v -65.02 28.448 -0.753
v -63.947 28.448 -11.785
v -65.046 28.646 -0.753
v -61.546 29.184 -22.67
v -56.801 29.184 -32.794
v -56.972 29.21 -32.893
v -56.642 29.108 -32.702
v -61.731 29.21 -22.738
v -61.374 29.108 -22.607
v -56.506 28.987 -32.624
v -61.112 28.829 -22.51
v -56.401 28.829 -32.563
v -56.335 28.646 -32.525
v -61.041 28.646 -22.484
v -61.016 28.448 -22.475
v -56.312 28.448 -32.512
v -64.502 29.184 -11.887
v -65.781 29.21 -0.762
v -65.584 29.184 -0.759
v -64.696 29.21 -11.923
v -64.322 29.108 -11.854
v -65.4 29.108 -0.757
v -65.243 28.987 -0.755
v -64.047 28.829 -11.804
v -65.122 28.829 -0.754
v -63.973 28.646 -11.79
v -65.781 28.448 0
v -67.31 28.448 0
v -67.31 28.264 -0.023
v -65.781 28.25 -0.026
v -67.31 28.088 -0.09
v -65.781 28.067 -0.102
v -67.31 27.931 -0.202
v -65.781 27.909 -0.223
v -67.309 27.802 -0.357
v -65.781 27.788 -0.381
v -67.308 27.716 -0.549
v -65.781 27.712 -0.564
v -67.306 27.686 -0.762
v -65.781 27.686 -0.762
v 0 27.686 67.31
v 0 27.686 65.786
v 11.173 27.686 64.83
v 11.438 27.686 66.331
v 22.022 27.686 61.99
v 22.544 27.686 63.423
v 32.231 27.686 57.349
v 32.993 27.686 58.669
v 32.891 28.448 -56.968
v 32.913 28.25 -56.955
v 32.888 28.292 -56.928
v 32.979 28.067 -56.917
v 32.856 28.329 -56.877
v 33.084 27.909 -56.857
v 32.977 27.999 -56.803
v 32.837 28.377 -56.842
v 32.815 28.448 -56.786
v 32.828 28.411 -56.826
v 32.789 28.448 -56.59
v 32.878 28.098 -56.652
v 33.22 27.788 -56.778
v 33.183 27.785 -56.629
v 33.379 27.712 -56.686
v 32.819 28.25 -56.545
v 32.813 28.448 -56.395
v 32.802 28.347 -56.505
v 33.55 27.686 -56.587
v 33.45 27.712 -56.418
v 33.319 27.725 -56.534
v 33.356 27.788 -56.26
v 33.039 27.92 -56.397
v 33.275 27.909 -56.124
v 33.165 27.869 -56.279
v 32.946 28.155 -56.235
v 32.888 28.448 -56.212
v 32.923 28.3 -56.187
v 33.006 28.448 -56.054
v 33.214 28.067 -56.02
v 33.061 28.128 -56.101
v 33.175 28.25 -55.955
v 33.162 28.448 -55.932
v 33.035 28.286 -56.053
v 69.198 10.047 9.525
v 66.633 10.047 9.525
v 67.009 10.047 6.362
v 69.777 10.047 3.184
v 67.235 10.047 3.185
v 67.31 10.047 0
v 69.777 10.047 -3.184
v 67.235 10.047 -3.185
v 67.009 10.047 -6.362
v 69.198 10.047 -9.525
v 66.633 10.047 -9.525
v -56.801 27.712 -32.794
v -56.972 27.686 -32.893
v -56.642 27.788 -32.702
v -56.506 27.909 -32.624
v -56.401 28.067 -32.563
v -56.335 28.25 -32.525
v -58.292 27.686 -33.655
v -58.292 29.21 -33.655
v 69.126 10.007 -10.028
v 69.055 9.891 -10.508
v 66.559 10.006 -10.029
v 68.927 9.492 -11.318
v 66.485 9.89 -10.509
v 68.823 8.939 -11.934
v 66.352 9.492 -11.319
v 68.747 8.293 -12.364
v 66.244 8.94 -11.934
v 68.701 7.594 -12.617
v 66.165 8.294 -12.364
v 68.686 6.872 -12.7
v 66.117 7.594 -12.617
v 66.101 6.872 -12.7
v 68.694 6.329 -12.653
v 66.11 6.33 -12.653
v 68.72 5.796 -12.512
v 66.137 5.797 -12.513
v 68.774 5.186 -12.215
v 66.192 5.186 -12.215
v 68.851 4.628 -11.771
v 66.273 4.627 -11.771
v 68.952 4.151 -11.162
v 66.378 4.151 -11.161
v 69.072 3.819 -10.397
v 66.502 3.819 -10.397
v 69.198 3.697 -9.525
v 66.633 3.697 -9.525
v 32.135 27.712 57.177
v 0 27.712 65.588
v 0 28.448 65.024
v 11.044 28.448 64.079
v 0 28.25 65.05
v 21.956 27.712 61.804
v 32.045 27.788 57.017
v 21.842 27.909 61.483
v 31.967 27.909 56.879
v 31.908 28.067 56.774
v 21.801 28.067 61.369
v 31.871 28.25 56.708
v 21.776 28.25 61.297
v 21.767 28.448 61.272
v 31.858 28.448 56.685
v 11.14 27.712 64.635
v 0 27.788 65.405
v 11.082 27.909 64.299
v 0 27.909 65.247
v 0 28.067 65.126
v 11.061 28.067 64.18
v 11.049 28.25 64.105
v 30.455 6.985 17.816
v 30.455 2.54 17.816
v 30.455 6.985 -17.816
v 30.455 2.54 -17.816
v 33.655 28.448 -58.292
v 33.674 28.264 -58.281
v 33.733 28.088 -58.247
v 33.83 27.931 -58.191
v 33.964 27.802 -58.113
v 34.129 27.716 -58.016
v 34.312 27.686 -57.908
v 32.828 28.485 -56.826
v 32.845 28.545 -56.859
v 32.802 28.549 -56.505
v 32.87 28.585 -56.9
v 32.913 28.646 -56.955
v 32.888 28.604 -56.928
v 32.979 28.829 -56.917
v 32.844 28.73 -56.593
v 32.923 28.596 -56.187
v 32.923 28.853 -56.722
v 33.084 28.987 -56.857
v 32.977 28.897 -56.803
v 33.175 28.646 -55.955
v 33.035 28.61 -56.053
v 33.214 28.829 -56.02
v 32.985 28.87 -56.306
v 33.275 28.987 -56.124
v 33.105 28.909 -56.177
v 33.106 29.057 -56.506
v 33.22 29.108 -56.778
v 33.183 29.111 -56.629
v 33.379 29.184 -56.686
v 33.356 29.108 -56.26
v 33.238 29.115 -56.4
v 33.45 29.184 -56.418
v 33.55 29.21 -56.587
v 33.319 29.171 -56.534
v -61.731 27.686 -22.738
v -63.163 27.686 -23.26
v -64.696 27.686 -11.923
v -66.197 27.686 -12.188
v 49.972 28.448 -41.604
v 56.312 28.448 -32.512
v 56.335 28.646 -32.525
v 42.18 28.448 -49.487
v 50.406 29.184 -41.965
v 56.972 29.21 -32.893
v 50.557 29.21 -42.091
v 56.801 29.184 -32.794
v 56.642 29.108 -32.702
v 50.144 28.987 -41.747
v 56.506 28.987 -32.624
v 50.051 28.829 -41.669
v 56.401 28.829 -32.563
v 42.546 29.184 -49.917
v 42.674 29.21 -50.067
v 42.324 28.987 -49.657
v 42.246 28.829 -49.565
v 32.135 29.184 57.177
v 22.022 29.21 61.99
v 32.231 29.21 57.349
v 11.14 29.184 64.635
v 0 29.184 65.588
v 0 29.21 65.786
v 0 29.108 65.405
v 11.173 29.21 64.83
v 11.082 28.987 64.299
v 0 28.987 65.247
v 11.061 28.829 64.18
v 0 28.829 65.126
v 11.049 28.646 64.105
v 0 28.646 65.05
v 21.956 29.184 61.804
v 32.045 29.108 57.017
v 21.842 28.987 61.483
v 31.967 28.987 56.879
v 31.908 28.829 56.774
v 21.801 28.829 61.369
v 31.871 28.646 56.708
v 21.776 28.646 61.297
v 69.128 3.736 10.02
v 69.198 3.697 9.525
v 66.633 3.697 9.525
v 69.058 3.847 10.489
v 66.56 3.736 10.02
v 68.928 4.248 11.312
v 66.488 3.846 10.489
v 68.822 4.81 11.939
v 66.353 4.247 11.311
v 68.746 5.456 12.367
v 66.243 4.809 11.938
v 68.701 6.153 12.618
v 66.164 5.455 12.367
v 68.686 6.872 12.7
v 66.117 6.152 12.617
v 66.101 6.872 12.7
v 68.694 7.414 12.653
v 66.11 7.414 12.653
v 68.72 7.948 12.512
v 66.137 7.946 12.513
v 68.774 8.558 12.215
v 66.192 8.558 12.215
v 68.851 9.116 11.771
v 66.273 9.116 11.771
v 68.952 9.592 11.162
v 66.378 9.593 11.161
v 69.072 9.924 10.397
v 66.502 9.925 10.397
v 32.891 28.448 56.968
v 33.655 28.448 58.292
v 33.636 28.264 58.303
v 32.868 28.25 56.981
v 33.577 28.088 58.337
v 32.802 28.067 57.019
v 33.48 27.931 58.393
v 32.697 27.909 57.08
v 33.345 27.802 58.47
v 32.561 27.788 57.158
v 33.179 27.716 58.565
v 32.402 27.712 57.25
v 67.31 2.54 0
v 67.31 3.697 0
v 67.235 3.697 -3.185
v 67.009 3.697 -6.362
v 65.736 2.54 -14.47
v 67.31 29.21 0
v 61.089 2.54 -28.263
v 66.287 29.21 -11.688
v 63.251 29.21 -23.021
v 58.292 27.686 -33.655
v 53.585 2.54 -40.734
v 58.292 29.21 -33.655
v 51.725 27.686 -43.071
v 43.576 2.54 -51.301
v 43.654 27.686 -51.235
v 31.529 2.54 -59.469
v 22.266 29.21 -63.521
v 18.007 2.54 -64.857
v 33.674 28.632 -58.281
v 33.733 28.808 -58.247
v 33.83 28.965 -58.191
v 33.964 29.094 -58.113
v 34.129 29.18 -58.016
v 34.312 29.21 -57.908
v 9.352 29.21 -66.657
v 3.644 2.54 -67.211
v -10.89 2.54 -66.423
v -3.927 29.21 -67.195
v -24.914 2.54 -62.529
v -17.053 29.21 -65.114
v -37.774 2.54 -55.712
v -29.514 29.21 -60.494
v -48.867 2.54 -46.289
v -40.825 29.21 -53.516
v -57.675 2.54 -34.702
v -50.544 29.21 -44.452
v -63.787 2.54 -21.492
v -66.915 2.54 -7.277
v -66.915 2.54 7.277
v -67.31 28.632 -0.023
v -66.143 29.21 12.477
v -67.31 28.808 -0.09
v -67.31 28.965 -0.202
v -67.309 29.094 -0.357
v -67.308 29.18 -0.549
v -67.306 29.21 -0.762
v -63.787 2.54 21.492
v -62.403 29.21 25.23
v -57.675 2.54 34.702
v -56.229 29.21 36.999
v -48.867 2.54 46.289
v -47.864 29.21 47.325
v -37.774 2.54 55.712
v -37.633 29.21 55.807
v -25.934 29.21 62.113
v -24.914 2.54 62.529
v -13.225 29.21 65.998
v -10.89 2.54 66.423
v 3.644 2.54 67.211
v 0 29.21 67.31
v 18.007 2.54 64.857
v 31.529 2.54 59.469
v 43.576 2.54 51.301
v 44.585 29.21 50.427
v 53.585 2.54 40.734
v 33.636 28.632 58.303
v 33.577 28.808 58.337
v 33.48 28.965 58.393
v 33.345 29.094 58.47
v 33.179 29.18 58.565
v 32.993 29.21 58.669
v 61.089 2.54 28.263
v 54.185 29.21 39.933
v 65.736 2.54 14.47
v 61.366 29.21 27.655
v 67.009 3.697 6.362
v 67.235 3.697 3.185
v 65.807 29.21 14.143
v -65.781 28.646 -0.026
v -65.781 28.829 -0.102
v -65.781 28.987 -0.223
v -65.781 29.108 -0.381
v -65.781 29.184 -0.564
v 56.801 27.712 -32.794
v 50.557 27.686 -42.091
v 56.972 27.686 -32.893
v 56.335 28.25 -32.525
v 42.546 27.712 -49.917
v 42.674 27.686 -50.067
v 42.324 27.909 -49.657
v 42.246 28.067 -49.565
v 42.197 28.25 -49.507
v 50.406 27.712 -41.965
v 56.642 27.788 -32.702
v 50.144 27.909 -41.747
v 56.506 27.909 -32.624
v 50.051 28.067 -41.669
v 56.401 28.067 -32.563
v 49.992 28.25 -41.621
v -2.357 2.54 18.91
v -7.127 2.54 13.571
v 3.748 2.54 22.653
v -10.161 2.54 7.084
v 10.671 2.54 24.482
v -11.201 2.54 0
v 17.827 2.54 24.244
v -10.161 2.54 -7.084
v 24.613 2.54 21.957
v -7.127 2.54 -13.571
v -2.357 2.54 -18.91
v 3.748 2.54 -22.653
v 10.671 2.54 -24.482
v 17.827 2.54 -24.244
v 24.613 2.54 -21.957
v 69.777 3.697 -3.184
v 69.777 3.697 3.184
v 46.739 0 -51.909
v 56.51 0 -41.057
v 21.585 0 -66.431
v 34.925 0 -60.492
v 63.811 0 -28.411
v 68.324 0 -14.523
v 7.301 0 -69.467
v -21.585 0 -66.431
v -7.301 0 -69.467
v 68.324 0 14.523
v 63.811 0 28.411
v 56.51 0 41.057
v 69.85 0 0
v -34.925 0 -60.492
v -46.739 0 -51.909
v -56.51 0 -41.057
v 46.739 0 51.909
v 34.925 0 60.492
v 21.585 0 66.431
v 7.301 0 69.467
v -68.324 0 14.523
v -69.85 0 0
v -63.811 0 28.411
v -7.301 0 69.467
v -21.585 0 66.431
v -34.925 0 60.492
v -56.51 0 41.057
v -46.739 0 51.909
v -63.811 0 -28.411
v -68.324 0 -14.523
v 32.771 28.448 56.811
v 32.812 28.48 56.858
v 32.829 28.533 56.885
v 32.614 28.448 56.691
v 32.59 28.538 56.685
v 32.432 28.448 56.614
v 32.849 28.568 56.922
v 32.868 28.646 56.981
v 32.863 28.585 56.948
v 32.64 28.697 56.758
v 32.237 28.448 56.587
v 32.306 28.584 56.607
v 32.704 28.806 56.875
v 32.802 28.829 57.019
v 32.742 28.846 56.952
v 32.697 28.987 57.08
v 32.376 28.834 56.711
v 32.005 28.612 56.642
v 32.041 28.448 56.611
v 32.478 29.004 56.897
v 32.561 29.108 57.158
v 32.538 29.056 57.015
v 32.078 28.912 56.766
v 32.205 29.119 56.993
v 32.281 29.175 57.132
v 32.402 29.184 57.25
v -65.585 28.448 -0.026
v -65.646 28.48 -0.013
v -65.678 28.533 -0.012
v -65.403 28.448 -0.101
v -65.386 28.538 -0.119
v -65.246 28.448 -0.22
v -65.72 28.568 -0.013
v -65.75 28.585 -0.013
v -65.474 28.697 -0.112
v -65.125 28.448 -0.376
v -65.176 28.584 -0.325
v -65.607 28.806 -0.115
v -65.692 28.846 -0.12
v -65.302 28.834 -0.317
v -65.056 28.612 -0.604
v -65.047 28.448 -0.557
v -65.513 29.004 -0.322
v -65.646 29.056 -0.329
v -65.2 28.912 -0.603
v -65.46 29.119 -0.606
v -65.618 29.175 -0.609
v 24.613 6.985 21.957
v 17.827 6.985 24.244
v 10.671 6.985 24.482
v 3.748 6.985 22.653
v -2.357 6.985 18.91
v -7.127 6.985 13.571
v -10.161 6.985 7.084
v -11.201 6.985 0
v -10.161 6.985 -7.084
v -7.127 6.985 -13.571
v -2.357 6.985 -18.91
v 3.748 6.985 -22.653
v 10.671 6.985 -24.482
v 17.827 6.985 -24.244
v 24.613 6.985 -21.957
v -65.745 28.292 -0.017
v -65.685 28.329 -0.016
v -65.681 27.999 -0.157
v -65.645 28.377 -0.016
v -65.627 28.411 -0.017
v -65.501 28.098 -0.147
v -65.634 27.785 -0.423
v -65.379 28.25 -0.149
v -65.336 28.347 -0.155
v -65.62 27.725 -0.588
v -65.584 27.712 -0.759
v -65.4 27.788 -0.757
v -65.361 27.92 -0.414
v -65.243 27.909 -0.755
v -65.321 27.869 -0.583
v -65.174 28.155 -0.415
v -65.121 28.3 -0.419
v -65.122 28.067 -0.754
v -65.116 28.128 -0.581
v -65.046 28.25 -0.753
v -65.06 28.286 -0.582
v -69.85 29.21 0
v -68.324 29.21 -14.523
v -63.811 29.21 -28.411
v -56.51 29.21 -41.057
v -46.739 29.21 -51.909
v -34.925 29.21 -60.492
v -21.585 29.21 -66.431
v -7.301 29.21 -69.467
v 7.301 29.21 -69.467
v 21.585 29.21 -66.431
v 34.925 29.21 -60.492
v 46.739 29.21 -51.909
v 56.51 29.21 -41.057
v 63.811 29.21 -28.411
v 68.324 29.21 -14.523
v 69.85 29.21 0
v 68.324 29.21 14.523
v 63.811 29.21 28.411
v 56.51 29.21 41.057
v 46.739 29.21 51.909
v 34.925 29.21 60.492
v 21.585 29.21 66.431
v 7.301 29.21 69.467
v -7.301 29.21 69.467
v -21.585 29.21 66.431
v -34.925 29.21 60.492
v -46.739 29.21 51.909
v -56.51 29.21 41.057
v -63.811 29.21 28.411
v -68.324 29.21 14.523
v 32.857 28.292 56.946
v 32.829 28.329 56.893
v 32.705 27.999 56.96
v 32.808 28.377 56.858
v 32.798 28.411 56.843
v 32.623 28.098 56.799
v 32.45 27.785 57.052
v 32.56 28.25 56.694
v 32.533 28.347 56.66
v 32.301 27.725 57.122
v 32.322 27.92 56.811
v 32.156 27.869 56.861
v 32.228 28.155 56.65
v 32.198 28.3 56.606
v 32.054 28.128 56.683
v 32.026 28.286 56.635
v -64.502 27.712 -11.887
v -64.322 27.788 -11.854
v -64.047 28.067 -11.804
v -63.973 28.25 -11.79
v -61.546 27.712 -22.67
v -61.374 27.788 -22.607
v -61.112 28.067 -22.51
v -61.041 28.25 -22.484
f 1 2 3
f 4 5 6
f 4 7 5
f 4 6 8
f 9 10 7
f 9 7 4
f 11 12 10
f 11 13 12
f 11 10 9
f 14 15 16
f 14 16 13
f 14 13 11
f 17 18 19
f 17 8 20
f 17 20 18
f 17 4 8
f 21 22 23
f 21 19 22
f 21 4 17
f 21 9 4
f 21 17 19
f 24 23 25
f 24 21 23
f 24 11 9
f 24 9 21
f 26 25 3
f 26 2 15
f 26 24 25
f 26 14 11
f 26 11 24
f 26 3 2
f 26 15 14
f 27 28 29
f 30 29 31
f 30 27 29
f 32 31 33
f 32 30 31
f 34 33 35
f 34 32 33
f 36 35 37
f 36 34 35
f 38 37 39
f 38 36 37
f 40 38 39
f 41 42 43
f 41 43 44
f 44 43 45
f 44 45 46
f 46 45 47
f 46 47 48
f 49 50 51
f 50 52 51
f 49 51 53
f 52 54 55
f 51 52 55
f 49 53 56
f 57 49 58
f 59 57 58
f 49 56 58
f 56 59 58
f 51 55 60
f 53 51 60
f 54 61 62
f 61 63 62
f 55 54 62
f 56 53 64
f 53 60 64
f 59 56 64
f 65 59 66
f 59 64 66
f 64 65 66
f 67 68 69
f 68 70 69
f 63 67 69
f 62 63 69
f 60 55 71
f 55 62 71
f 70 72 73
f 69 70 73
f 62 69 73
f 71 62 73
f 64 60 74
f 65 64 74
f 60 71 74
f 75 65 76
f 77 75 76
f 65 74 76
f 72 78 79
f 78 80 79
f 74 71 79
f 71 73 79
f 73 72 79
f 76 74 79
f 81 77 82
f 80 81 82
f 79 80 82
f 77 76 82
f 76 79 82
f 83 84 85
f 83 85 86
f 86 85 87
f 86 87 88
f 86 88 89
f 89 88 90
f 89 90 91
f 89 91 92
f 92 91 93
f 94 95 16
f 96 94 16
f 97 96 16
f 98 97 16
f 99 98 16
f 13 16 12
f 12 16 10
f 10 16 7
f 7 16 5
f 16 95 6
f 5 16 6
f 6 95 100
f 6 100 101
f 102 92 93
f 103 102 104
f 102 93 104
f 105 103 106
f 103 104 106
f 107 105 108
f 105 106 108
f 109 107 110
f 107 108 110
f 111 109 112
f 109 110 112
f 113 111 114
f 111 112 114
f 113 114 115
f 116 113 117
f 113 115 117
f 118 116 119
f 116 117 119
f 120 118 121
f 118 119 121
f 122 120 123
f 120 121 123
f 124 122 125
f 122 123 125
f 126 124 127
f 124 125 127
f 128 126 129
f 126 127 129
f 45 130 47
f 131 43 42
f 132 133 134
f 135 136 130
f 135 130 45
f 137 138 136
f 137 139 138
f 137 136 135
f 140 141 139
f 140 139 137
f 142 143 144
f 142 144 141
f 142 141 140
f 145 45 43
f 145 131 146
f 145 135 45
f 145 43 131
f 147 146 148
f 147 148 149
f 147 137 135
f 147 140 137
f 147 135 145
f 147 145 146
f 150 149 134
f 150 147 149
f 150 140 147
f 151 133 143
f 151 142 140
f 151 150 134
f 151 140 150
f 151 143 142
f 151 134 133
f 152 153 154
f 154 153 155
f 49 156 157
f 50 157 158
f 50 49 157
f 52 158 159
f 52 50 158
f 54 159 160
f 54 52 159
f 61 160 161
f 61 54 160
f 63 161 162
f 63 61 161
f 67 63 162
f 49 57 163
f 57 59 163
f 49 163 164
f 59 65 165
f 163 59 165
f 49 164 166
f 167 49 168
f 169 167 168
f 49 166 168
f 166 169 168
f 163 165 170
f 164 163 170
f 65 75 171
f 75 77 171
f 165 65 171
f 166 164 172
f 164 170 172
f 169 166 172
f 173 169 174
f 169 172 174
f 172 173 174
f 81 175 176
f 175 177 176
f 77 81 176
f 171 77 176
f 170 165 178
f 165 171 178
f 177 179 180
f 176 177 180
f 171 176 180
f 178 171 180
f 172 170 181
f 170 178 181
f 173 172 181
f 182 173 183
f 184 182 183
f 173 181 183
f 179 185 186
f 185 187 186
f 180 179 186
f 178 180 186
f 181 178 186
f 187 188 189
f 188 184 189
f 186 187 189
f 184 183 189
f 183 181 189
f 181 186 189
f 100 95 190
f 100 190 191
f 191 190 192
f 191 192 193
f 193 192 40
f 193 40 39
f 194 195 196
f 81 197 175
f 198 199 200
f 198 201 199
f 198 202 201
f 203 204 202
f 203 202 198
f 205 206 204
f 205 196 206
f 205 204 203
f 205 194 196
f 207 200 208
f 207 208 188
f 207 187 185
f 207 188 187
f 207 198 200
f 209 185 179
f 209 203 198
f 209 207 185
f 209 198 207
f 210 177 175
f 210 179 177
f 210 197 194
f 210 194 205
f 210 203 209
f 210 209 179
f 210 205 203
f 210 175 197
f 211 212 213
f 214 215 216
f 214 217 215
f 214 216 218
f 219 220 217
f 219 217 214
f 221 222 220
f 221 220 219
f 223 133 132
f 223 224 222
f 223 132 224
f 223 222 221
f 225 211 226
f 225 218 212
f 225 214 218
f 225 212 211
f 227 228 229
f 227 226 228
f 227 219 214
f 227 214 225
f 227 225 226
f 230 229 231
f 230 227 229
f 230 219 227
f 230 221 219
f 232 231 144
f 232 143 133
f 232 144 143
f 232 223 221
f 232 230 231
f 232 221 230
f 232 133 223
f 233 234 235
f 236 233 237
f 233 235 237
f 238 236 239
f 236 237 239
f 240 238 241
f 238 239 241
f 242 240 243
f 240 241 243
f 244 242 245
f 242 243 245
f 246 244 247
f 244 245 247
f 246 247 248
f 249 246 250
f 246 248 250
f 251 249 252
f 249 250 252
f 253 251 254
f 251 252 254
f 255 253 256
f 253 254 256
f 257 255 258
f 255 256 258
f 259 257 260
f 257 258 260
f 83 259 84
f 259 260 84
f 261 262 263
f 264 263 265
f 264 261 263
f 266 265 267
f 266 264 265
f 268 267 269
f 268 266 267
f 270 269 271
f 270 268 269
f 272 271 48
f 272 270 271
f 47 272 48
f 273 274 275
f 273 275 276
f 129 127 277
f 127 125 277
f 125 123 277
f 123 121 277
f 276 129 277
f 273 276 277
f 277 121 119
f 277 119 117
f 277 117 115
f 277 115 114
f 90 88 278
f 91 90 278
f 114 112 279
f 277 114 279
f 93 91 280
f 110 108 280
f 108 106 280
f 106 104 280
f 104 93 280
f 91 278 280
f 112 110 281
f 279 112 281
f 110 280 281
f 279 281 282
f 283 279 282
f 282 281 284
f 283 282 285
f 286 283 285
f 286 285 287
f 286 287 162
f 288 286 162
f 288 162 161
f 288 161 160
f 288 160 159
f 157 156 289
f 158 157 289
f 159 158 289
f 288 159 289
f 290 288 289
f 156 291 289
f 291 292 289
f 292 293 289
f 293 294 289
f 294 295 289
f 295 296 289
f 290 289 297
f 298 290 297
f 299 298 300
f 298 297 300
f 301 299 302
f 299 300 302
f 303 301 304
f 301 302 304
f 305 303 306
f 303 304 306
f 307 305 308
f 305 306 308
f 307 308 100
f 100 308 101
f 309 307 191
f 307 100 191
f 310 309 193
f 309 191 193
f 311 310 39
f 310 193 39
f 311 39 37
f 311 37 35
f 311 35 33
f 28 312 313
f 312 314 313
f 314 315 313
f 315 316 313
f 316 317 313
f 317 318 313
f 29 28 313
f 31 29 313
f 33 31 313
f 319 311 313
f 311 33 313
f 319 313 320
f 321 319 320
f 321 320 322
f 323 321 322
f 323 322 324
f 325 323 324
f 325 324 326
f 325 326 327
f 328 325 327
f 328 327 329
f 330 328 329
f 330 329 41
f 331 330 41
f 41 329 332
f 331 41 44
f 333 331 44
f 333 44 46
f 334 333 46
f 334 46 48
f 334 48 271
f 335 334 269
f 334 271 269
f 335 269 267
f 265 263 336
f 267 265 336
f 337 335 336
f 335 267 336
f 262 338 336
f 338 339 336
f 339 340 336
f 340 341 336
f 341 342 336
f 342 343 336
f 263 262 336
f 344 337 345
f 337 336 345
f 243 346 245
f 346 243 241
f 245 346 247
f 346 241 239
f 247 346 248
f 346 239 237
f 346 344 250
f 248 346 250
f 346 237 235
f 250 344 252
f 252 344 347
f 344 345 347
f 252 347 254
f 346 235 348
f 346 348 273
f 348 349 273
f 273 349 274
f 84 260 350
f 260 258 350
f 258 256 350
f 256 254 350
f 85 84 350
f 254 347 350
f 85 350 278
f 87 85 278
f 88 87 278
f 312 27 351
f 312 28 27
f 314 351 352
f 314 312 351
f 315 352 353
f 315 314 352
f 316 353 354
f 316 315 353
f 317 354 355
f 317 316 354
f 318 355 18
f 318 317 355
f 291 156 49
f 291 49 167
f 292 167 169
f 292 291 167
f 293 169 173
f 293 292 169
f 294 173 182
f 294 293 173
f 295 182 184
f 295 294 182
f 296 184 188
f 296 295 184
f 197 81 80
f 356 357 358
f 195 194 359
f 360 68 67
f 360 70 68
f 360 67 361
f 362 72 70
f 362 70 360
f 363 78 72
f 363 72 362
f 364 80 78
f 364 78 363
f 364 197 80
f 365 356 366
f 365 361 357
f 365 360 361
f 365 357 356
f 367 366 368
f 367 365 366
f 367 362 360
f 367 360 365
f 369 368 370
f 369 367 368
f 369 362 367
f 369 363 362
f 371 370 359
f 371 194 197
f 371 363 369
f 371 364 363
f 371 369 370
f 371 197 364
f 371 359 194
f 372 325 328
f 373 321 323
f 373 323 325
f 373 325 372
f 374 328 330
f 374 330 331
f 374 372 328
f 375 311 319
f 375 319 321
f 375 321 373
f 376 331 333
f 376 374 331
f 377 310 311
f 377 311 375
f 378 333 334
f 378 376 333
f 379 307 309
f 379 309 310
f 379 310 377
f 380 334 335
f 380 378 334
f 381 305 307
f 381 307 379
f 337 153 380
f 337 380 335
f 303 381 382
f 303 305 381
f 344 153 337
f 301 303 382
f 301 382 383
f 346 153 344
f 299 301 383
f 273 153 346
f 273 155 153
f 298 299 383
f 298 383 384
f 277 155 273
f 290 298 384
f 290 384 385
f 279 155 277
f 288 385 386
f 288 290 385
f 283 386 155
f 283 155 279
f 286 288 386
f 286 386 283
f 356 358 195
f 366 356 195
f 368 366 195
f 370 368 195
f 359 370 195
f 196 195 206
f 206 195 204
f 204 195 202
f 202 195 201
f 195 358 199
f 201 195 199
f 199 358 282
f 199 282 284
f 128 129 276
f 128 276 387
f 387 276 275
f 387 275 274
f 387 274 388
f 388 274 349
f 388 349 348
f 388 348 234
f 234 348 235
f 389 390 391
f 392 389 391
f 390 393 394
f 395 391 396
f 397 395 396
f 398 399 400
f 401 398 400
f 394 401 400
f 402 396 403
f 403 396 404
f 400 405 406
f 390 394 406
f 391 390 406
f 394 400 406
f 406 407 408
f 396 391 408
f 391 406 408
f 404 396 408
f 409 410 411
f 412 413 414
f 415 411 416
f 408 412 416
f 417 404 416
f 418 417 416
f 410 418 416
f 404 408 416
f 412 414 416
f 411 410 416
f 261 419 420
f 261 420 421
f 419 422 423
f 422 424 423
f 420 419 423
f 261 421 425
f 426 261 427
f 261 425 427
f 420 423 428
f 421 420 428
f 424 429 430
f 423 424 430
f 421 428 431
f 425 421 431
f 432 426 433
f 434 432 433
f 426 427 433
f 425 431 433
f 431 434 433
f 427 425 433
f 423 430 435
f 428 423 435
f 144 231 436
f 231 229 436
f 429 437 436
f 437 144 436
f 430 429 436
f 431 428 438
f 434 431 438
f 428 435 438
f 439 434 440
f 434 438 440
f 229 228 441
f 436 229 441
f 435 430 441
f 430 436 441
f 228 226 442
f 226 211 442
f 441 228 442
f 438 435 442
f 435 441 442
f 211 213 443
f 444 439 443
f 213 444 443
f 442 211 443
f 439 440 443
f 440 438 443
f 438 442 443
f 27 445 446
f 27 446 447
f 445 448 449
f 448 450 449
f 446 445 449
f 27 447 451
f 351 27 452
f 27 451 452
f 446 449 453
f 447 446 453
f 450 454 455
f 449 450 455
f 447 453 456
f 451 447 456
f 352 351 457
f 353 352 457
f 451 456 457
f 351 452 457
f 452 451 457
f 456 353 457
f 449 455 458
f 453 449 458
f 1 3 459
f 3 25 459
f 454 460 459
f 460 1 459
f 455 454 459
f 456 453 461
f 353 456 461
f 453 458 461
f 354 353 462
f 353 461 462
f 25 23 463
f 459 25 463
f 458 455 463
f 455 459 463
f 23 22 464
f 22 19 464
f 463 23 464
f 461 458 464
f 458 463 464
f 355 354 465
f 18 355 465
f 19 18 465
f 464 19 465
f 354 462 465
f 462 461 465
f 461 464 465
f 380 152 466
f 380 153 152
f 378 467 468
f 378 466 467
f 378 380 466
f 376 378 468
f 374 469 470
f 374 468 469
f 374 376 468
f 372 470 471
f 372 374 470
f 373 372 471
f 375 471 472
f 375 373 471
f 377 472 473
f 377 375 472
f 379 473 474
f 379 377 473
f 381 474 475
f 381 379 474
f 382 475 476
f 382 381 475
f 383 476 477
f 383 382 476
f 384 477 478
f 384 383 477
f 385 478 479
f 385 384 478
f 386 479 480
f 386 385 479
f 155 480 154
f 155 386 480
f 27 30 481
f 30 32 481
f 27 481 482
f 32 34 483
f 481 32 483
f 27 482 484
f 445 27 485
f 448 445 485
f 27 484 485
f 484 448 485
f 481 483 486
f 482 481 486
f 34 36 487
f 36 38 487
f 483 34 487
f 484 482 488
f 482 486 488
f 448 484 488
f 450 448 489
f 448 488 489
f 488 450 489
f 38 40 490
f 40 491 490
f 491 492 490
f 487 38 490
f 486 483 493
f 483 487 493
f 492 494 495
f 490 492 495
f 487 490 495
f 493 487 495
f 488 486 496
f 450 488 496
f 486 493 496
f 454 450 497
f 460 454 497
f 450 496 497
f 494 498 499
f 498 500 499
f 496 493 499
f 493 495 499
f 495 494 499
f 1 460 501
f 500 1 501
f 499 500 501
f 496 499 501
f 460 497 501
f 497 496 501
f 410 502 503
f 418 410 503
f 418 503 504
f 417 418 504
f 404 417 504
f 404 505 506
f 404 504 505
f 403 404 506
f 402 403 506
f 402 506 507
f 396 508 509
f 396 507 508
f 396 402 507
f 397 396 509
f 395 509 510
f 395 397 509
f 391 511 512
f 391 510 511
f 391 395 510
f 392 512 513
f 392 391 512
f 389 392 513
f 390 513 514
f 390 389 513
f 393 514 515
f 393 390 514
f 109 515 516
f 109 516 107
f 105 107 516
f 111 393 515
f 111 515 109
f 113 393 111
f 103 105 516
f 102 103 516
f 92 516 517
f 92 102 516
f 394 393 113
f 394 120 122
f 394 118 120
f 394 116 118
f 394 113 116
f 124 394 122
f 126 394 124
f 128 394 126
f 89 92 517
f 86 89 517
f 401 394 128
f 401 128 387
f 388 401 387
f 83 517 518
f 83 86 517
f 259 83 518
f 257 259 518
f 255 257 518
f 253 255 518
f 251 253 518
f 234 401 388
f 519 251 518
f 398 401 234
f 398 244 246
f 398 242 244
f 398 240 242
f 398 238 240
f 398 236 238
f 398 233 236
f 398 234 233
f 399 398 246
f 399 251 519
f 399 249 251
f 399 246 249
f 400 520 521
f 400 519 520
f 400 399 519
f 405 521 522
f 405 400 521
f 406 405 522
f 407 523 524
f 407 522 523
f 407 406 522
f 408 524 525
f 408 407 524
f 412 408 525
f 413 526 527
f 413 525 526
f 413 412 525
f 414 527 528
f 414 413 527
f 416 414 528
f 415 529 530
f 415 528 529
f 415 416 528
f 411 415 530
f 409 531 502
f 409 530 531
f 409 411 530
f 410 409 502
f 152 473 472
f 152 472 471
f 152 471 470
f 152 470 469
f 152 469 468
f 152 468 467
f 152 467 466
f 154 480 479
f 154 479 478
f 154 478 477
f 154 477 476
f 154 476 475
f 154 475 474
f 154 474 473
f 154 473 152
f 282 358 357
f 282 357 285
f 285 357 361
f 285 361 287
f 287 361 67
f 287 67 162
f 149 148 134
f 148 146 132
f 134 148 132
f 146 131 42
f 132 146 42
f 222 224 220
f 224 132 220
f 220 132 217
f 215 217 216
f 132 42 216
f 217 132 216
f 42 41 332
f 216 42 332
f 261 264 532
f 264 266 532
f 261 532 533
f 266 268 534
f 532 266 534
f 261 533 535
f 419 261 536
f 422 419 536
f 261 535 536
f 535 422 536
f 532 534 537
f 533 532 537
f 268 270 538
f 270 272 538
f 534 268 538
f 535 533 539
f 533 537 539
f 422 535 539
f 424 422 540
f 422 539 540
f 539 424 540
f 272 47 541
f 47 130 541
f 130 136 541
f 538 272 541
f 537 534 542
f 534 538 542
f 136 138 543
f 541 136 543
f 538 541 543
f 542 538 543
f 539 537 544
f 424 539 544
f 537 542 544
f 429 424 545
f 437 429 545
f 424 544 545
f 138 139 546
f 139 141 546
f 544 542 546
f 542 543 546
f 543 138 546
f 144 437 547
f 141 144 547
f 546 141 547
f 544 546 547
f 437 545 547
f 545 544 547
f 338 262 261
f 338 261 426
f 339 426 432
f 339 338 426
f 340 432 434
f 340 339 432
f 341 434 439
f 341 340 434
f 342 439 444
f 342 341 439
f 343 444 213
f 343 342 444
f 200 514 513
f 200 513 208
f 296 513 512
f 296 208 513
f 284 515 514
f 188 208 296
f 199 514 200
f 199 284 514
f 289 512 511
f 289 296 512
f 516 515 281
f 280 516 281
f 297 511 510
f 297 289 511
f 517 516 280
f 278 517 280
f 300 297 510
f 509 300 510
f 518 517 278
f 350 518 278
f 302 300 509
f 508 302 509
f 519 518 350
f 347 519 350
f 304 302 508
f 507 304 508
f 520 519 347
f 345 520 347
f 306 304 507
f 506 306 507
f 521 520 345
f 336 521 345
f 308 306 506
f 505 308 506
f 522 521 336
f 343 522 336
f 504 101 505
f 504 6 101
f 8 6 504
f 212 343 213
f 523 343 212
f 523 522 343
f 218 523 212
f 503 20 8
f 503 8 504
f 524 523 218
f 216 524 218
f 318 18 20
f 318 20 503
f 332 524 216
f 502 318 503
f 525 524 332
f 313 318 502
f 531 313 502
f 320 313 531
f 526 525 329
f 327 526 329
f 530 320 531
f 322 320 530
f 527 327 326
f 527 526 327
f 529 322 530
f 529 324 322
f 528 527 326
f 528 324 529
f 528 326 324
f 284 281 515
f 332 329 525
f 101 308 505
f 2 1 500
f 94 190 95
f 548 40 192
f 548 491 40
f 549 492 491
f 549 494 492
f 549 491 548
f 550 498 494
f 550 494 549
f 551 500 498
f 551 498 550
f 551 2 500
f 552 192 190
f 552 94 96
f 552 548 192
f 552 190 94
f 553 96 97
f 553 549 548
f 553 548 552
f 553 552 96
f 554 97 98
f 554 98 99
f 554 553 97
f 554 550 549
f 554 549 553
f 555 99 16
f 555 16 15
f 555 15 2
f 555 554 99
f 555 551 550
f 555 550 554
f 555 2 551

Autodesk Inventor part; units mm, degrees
ref_plane "YZ Plane" through (0, 0, 0) normal (1, 0, 0) x (0, 1, 0)
ref_plane "XZ Plane" through (0, 0, 0) normal (0, 1, 0) x (-1, 0, 0)
ref_plane "XY Plane" through (0, 0, 0) normal (0, 0, 1) x (1, 0, 0)
sketch "Sketch1" plane through (0, 0, 0) normal (0, 1, 0) x (-1, 0, 0)
  circle A0 centre (0, 0) radius 69.85
  dimension "d0" = 139.7
extrude "Extrusion1" add sketch "Sketch1" along normal blind 29.21
sketch "Sketch3" plane through (0, 29.21, 0) normal (0, 1, 0) x (1, 0, 0)
  circle A0 centre (0, 0) radius 67.31
  dimension "d5" = 134.62
extrude "Extrusion2" cut sketch "Sketch3" against normal blind 26.67
sketch "Sketch6" plane through (0, 0, 0) normal (1, 0, 0) x (0, 1, 0)
  line L0 (29.21, 67.31) -> (2.54, 67.31) projected
  line L1 (29.21, 67.31) -> (27.686, 67.31)
  line L2 (27.686, 67.31) -> (27.686, 65.024)
  line L3 (27.686, 65.024) -> (29.21, 65.024)
  line L4 (29.21, 65.024) -> (29.21, 67.31)
  line L5 (-5.842, 0) -> (35.052, 0) projected
  line L6 (29.21, -69.85) -> (29.21, 69.85) projected
  point P0 (0, 0)
  dimension "d21" = 1.524
  dimension "d22" = 2.286
  dimension "d36" = 0
revolve "Revolution1" add sketch "Sketch6" angle 30 about axis through (0, -10, 0) along (0, 1, 0)
fillet "Fillet2" radius 0.762 2 edges at (16.8294, 27.686, 62.8084) (16.8294, 29.21, 62.8084)
fillet "Fillet3" radius 0.762 3 edges at (32.6235, 27.909, 56.5056) (33.2739, 29.21, 57.632) (33.2739, 27.686, 57.632)
pattern_circular "Circular Pattern1" count 3 over 360 about axis through (0, 0, 0) along (0, 1, 0) of "Revolution1", "Fillet2", "Fillet3"
sketch "Sketch9" plane through (0, 0, 0) normal (1, 0, 0) x (0, 1, 0)
  circle A0 centre (6.8717, 0) radius 3.175 construction
  line L0 (6.8717, 0) -> (6.8717, -12.7) construction
  line L1 (6.8717, 0) -> (6.8717, 12.7) construction
  line L2 (6.8717, -12.7) -> (6.8717, -12.7)
  line L3 (3.6967, -9.525) -> (3.6967, 9.525)
  line L4 (6.8717, 12.7) -> (6.8717, 12.7)
  line L5 (10.0467, 9.525) -> (10.0467, -9.525)
  arc A1 (6.8717, -12.7) -> (10.0467, -9.525) centre (6.8717, -9.525) ccw
  arc A2 (3.6967, -9.525) -> (6.8717, -12.7) centre (6.8717, -9.525) ccw
  arc A3 (6.8717, 12.7) -> (3.6967, 9.525) centre (6.8717, 9.525) ccw
  arc A4 (10.0467, 9.525) -> (6.8717, 12.7) centre (6.8717, 9.525) ccw
  point P0 (0, 0)
  dimension "d37" = 6.35
  dimension "d48" = 12.7
  dimension "d49" = 12.7
  dimension "d50" = 3.175
extrude "Extrusion9" cut sketch "Sketch9" along normal through all
sketch "Sketch20" plane through (0, 2.54, 0) normal (0, 1, 0) x (1, 0, 0)
  circle A0 centre (0, 0) radius 3.4925
  circle A1 centre (13.4366, 0) radius 24.638
  line L0 (38.0746, 0) -> (30.4546, 0) construction
  line L1 (30.4546, 0) -> (30.4546, -17.8162)
  line L2 (30.4546, 0) -> (30.4546, 17.8162)
  dimension "d70" = 6.985
  dimension "d71" = 49.276
  dimension "d72" = 13.4366
  dimension "d73" = 7.62
extrude "Extrusion13" add sketch "Sketch20" along normal blind 4.445 contours A0 | L2 L1 A1 picked at (19.7197, -7.6808)
properties part number "bottom_basket_2"
